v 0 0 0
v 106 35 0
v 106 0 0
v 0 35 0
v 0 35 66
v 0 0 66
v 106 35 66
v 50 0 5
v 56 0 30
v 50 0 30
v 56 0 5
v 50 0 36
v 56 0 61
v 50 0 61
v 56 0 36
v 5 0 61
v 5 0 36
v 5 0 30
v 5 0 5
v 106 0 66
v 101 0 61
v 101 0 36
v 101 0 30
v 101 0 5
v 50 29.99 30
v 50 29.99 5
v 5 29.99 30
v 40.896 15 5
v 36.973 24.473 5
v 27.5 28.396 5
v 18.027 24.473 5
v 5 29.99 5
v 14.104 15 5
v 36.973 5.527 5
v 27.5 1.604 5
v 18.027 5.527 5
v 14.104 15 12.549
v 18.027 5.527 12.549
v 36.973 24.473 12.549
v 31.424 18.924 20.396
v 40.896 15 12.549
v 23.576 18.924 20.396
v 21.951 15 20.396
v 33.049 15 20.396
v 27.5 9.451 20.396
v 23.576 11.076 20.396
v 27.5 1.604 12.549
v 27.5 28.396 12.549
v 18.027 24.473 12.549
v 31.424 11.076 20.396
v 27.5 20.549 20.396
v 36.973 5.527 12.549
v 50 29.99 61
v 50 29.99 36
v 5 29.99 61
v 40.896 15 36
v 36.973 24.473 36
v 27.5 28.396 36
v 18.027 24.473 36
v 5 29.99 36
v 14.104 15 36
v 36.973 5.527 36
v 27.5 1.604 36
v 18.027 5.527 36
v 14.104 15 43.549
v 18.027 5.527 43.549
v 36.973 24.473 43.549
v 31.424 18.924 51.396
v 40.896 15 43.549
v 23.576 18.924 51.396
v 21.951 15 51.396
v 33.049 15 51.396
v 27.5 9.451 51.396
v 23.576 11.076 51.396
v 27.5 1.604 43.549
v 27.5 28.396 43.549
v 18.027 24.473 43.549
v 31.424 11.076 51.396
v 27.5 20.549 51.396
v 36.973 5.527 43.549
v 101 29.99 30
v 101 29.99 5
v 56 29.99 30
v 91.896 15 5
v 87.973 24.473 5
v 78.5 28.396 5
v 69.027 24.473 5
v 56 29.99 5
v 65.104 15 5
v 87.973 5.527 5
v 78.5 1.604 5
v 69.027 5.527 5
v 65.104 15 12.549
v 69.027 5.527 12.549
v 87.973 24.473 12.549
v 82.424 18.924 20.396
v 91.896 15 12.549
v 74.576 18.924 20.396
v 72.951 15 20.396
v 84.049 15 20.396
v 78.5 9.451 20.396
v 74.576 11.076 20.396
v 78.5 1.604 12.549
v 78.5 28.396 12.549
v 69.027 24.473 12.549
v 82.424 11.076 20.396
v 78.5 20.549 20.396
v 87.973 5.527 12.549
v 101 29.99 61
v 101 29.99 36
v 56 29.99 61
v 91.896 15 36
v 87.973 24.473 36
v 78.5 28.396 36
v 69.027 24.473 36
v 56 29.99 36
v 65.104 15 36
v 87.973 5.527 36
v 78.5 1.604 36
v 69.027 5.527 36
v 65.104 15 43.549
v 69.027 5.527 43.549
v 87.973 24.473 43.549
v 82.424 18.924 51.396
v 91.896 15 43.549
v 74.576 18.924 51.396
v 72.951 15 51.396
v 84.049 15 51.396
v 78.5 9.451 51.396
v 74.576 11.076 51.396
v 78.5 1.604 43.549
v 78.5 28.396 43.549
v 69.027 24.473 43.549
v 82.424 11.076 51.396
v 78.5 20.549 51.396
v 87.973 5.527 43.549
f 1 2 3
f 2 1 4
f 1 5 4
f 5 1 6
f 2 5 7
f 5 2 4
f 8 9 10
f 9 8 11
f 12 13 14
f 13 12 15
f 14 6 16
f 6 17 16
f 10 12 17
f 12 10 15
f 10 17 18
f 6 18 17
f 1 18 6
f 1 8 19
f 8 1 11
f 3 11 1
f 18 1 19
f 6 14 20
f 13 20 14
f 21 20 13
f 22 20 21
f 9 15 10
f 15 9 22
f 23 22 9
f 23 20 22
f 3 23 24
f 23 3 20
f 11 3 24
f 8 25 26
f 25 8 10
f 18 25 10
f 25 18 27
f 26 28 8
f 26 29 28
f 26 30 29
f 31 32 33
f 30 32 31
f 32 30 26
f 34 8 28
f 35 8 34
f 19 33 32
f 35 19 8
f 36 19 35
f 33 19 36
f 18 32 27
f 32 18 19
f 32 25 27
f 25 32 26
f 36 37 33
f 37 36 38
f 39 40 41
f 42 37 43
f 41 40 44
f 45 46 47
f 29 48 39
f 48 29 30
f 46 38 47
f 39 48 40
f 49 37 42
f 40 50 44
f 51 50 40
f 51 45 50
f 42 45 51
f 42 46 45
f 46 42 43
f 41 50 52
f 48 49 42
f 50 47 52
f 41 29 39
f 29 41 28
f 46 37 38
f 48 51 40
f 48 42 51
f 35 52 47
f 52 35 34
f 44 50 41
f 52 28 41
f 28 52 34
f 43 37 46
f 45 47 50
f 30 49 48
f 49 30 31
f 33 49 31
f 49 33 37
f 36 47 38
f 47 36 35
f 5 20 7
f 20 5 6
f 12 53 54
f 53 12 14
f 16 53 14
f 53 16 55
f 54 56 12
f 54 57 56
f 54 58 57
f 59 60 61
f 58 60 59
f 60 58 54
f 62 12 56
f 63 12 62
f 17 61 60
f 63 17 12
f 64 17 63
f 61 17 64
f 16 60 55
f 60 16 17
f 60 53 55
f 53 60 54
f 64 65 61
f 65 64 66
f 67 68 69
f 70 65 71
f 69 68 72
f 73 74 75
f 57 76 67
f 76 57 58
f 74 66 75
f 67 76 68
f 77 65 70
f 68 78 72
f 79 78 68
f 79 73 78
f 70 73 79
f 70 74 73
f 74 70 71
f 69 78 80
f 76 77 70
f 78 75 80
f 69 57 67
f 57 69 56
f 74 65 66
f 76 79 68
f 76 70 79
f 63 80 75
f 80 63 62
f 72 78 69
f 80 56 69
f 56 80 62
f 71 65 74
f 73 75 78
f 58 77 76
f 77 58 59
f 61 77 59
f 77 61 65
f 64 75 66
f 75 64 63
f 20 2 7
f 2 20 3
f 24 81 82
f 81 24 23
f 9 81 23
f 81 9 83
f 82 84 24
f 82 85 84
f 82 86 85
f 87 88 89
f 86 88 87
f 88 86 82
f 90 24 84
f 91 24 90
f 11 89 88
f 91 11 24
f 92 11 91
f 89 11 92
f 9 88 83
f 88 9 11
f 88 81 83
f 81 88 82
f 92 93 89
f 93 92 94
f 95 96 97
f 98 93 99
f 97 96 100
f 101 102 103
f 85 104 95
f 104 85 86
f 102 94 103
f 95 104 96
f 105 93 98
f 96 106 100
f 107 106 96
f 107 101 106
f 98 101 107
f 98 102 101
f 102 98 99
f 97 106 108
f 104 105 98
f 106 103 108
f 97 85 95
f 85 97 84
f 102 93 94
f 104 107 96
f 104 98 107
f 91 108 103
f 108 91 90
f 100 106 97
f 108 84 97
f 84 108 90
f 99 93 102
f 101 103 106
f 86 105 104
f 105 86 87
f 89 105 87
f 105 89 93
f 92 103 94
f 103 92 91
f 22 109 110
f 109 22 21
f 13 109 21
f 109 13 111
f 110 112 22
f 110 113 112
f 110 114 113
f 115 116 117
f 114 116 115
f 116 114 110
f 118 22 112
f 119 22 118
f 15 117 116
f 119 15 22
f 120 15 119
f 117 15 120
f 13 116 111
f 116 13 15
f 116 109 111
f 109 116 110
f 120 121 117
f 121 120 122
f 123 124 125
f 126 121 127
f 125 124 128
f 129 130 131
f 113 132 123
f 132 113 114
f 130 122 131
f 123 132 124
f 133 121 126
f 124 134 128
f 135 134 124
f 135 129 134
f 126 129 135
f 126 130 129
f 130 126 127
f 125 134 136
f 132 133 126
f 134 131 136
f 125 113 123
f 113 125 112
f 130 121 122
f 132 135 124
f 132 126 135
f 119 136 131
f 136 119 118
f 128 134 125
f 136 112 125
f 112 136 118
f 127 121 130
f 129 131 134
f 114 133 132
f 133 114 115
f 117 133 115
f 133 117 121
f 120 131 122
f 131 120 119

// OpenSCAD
for (x = [0:1]) {
  for (y = [0:1]) {
    translate ([(x*51),0,(y*31)]) {
      difference () {
        cube ([55,35,35]);
        translate ([5,-0.01,5]) {
          cube ([45,30,25]);
        }
      }
      translate ([27.5,15,7]) {
        difference () {
          sphere (d=29, $fn=8);
          translate([0,0,-20]) {
            cube (32,center=true);
          }
        }
      }
    }
  }
}
